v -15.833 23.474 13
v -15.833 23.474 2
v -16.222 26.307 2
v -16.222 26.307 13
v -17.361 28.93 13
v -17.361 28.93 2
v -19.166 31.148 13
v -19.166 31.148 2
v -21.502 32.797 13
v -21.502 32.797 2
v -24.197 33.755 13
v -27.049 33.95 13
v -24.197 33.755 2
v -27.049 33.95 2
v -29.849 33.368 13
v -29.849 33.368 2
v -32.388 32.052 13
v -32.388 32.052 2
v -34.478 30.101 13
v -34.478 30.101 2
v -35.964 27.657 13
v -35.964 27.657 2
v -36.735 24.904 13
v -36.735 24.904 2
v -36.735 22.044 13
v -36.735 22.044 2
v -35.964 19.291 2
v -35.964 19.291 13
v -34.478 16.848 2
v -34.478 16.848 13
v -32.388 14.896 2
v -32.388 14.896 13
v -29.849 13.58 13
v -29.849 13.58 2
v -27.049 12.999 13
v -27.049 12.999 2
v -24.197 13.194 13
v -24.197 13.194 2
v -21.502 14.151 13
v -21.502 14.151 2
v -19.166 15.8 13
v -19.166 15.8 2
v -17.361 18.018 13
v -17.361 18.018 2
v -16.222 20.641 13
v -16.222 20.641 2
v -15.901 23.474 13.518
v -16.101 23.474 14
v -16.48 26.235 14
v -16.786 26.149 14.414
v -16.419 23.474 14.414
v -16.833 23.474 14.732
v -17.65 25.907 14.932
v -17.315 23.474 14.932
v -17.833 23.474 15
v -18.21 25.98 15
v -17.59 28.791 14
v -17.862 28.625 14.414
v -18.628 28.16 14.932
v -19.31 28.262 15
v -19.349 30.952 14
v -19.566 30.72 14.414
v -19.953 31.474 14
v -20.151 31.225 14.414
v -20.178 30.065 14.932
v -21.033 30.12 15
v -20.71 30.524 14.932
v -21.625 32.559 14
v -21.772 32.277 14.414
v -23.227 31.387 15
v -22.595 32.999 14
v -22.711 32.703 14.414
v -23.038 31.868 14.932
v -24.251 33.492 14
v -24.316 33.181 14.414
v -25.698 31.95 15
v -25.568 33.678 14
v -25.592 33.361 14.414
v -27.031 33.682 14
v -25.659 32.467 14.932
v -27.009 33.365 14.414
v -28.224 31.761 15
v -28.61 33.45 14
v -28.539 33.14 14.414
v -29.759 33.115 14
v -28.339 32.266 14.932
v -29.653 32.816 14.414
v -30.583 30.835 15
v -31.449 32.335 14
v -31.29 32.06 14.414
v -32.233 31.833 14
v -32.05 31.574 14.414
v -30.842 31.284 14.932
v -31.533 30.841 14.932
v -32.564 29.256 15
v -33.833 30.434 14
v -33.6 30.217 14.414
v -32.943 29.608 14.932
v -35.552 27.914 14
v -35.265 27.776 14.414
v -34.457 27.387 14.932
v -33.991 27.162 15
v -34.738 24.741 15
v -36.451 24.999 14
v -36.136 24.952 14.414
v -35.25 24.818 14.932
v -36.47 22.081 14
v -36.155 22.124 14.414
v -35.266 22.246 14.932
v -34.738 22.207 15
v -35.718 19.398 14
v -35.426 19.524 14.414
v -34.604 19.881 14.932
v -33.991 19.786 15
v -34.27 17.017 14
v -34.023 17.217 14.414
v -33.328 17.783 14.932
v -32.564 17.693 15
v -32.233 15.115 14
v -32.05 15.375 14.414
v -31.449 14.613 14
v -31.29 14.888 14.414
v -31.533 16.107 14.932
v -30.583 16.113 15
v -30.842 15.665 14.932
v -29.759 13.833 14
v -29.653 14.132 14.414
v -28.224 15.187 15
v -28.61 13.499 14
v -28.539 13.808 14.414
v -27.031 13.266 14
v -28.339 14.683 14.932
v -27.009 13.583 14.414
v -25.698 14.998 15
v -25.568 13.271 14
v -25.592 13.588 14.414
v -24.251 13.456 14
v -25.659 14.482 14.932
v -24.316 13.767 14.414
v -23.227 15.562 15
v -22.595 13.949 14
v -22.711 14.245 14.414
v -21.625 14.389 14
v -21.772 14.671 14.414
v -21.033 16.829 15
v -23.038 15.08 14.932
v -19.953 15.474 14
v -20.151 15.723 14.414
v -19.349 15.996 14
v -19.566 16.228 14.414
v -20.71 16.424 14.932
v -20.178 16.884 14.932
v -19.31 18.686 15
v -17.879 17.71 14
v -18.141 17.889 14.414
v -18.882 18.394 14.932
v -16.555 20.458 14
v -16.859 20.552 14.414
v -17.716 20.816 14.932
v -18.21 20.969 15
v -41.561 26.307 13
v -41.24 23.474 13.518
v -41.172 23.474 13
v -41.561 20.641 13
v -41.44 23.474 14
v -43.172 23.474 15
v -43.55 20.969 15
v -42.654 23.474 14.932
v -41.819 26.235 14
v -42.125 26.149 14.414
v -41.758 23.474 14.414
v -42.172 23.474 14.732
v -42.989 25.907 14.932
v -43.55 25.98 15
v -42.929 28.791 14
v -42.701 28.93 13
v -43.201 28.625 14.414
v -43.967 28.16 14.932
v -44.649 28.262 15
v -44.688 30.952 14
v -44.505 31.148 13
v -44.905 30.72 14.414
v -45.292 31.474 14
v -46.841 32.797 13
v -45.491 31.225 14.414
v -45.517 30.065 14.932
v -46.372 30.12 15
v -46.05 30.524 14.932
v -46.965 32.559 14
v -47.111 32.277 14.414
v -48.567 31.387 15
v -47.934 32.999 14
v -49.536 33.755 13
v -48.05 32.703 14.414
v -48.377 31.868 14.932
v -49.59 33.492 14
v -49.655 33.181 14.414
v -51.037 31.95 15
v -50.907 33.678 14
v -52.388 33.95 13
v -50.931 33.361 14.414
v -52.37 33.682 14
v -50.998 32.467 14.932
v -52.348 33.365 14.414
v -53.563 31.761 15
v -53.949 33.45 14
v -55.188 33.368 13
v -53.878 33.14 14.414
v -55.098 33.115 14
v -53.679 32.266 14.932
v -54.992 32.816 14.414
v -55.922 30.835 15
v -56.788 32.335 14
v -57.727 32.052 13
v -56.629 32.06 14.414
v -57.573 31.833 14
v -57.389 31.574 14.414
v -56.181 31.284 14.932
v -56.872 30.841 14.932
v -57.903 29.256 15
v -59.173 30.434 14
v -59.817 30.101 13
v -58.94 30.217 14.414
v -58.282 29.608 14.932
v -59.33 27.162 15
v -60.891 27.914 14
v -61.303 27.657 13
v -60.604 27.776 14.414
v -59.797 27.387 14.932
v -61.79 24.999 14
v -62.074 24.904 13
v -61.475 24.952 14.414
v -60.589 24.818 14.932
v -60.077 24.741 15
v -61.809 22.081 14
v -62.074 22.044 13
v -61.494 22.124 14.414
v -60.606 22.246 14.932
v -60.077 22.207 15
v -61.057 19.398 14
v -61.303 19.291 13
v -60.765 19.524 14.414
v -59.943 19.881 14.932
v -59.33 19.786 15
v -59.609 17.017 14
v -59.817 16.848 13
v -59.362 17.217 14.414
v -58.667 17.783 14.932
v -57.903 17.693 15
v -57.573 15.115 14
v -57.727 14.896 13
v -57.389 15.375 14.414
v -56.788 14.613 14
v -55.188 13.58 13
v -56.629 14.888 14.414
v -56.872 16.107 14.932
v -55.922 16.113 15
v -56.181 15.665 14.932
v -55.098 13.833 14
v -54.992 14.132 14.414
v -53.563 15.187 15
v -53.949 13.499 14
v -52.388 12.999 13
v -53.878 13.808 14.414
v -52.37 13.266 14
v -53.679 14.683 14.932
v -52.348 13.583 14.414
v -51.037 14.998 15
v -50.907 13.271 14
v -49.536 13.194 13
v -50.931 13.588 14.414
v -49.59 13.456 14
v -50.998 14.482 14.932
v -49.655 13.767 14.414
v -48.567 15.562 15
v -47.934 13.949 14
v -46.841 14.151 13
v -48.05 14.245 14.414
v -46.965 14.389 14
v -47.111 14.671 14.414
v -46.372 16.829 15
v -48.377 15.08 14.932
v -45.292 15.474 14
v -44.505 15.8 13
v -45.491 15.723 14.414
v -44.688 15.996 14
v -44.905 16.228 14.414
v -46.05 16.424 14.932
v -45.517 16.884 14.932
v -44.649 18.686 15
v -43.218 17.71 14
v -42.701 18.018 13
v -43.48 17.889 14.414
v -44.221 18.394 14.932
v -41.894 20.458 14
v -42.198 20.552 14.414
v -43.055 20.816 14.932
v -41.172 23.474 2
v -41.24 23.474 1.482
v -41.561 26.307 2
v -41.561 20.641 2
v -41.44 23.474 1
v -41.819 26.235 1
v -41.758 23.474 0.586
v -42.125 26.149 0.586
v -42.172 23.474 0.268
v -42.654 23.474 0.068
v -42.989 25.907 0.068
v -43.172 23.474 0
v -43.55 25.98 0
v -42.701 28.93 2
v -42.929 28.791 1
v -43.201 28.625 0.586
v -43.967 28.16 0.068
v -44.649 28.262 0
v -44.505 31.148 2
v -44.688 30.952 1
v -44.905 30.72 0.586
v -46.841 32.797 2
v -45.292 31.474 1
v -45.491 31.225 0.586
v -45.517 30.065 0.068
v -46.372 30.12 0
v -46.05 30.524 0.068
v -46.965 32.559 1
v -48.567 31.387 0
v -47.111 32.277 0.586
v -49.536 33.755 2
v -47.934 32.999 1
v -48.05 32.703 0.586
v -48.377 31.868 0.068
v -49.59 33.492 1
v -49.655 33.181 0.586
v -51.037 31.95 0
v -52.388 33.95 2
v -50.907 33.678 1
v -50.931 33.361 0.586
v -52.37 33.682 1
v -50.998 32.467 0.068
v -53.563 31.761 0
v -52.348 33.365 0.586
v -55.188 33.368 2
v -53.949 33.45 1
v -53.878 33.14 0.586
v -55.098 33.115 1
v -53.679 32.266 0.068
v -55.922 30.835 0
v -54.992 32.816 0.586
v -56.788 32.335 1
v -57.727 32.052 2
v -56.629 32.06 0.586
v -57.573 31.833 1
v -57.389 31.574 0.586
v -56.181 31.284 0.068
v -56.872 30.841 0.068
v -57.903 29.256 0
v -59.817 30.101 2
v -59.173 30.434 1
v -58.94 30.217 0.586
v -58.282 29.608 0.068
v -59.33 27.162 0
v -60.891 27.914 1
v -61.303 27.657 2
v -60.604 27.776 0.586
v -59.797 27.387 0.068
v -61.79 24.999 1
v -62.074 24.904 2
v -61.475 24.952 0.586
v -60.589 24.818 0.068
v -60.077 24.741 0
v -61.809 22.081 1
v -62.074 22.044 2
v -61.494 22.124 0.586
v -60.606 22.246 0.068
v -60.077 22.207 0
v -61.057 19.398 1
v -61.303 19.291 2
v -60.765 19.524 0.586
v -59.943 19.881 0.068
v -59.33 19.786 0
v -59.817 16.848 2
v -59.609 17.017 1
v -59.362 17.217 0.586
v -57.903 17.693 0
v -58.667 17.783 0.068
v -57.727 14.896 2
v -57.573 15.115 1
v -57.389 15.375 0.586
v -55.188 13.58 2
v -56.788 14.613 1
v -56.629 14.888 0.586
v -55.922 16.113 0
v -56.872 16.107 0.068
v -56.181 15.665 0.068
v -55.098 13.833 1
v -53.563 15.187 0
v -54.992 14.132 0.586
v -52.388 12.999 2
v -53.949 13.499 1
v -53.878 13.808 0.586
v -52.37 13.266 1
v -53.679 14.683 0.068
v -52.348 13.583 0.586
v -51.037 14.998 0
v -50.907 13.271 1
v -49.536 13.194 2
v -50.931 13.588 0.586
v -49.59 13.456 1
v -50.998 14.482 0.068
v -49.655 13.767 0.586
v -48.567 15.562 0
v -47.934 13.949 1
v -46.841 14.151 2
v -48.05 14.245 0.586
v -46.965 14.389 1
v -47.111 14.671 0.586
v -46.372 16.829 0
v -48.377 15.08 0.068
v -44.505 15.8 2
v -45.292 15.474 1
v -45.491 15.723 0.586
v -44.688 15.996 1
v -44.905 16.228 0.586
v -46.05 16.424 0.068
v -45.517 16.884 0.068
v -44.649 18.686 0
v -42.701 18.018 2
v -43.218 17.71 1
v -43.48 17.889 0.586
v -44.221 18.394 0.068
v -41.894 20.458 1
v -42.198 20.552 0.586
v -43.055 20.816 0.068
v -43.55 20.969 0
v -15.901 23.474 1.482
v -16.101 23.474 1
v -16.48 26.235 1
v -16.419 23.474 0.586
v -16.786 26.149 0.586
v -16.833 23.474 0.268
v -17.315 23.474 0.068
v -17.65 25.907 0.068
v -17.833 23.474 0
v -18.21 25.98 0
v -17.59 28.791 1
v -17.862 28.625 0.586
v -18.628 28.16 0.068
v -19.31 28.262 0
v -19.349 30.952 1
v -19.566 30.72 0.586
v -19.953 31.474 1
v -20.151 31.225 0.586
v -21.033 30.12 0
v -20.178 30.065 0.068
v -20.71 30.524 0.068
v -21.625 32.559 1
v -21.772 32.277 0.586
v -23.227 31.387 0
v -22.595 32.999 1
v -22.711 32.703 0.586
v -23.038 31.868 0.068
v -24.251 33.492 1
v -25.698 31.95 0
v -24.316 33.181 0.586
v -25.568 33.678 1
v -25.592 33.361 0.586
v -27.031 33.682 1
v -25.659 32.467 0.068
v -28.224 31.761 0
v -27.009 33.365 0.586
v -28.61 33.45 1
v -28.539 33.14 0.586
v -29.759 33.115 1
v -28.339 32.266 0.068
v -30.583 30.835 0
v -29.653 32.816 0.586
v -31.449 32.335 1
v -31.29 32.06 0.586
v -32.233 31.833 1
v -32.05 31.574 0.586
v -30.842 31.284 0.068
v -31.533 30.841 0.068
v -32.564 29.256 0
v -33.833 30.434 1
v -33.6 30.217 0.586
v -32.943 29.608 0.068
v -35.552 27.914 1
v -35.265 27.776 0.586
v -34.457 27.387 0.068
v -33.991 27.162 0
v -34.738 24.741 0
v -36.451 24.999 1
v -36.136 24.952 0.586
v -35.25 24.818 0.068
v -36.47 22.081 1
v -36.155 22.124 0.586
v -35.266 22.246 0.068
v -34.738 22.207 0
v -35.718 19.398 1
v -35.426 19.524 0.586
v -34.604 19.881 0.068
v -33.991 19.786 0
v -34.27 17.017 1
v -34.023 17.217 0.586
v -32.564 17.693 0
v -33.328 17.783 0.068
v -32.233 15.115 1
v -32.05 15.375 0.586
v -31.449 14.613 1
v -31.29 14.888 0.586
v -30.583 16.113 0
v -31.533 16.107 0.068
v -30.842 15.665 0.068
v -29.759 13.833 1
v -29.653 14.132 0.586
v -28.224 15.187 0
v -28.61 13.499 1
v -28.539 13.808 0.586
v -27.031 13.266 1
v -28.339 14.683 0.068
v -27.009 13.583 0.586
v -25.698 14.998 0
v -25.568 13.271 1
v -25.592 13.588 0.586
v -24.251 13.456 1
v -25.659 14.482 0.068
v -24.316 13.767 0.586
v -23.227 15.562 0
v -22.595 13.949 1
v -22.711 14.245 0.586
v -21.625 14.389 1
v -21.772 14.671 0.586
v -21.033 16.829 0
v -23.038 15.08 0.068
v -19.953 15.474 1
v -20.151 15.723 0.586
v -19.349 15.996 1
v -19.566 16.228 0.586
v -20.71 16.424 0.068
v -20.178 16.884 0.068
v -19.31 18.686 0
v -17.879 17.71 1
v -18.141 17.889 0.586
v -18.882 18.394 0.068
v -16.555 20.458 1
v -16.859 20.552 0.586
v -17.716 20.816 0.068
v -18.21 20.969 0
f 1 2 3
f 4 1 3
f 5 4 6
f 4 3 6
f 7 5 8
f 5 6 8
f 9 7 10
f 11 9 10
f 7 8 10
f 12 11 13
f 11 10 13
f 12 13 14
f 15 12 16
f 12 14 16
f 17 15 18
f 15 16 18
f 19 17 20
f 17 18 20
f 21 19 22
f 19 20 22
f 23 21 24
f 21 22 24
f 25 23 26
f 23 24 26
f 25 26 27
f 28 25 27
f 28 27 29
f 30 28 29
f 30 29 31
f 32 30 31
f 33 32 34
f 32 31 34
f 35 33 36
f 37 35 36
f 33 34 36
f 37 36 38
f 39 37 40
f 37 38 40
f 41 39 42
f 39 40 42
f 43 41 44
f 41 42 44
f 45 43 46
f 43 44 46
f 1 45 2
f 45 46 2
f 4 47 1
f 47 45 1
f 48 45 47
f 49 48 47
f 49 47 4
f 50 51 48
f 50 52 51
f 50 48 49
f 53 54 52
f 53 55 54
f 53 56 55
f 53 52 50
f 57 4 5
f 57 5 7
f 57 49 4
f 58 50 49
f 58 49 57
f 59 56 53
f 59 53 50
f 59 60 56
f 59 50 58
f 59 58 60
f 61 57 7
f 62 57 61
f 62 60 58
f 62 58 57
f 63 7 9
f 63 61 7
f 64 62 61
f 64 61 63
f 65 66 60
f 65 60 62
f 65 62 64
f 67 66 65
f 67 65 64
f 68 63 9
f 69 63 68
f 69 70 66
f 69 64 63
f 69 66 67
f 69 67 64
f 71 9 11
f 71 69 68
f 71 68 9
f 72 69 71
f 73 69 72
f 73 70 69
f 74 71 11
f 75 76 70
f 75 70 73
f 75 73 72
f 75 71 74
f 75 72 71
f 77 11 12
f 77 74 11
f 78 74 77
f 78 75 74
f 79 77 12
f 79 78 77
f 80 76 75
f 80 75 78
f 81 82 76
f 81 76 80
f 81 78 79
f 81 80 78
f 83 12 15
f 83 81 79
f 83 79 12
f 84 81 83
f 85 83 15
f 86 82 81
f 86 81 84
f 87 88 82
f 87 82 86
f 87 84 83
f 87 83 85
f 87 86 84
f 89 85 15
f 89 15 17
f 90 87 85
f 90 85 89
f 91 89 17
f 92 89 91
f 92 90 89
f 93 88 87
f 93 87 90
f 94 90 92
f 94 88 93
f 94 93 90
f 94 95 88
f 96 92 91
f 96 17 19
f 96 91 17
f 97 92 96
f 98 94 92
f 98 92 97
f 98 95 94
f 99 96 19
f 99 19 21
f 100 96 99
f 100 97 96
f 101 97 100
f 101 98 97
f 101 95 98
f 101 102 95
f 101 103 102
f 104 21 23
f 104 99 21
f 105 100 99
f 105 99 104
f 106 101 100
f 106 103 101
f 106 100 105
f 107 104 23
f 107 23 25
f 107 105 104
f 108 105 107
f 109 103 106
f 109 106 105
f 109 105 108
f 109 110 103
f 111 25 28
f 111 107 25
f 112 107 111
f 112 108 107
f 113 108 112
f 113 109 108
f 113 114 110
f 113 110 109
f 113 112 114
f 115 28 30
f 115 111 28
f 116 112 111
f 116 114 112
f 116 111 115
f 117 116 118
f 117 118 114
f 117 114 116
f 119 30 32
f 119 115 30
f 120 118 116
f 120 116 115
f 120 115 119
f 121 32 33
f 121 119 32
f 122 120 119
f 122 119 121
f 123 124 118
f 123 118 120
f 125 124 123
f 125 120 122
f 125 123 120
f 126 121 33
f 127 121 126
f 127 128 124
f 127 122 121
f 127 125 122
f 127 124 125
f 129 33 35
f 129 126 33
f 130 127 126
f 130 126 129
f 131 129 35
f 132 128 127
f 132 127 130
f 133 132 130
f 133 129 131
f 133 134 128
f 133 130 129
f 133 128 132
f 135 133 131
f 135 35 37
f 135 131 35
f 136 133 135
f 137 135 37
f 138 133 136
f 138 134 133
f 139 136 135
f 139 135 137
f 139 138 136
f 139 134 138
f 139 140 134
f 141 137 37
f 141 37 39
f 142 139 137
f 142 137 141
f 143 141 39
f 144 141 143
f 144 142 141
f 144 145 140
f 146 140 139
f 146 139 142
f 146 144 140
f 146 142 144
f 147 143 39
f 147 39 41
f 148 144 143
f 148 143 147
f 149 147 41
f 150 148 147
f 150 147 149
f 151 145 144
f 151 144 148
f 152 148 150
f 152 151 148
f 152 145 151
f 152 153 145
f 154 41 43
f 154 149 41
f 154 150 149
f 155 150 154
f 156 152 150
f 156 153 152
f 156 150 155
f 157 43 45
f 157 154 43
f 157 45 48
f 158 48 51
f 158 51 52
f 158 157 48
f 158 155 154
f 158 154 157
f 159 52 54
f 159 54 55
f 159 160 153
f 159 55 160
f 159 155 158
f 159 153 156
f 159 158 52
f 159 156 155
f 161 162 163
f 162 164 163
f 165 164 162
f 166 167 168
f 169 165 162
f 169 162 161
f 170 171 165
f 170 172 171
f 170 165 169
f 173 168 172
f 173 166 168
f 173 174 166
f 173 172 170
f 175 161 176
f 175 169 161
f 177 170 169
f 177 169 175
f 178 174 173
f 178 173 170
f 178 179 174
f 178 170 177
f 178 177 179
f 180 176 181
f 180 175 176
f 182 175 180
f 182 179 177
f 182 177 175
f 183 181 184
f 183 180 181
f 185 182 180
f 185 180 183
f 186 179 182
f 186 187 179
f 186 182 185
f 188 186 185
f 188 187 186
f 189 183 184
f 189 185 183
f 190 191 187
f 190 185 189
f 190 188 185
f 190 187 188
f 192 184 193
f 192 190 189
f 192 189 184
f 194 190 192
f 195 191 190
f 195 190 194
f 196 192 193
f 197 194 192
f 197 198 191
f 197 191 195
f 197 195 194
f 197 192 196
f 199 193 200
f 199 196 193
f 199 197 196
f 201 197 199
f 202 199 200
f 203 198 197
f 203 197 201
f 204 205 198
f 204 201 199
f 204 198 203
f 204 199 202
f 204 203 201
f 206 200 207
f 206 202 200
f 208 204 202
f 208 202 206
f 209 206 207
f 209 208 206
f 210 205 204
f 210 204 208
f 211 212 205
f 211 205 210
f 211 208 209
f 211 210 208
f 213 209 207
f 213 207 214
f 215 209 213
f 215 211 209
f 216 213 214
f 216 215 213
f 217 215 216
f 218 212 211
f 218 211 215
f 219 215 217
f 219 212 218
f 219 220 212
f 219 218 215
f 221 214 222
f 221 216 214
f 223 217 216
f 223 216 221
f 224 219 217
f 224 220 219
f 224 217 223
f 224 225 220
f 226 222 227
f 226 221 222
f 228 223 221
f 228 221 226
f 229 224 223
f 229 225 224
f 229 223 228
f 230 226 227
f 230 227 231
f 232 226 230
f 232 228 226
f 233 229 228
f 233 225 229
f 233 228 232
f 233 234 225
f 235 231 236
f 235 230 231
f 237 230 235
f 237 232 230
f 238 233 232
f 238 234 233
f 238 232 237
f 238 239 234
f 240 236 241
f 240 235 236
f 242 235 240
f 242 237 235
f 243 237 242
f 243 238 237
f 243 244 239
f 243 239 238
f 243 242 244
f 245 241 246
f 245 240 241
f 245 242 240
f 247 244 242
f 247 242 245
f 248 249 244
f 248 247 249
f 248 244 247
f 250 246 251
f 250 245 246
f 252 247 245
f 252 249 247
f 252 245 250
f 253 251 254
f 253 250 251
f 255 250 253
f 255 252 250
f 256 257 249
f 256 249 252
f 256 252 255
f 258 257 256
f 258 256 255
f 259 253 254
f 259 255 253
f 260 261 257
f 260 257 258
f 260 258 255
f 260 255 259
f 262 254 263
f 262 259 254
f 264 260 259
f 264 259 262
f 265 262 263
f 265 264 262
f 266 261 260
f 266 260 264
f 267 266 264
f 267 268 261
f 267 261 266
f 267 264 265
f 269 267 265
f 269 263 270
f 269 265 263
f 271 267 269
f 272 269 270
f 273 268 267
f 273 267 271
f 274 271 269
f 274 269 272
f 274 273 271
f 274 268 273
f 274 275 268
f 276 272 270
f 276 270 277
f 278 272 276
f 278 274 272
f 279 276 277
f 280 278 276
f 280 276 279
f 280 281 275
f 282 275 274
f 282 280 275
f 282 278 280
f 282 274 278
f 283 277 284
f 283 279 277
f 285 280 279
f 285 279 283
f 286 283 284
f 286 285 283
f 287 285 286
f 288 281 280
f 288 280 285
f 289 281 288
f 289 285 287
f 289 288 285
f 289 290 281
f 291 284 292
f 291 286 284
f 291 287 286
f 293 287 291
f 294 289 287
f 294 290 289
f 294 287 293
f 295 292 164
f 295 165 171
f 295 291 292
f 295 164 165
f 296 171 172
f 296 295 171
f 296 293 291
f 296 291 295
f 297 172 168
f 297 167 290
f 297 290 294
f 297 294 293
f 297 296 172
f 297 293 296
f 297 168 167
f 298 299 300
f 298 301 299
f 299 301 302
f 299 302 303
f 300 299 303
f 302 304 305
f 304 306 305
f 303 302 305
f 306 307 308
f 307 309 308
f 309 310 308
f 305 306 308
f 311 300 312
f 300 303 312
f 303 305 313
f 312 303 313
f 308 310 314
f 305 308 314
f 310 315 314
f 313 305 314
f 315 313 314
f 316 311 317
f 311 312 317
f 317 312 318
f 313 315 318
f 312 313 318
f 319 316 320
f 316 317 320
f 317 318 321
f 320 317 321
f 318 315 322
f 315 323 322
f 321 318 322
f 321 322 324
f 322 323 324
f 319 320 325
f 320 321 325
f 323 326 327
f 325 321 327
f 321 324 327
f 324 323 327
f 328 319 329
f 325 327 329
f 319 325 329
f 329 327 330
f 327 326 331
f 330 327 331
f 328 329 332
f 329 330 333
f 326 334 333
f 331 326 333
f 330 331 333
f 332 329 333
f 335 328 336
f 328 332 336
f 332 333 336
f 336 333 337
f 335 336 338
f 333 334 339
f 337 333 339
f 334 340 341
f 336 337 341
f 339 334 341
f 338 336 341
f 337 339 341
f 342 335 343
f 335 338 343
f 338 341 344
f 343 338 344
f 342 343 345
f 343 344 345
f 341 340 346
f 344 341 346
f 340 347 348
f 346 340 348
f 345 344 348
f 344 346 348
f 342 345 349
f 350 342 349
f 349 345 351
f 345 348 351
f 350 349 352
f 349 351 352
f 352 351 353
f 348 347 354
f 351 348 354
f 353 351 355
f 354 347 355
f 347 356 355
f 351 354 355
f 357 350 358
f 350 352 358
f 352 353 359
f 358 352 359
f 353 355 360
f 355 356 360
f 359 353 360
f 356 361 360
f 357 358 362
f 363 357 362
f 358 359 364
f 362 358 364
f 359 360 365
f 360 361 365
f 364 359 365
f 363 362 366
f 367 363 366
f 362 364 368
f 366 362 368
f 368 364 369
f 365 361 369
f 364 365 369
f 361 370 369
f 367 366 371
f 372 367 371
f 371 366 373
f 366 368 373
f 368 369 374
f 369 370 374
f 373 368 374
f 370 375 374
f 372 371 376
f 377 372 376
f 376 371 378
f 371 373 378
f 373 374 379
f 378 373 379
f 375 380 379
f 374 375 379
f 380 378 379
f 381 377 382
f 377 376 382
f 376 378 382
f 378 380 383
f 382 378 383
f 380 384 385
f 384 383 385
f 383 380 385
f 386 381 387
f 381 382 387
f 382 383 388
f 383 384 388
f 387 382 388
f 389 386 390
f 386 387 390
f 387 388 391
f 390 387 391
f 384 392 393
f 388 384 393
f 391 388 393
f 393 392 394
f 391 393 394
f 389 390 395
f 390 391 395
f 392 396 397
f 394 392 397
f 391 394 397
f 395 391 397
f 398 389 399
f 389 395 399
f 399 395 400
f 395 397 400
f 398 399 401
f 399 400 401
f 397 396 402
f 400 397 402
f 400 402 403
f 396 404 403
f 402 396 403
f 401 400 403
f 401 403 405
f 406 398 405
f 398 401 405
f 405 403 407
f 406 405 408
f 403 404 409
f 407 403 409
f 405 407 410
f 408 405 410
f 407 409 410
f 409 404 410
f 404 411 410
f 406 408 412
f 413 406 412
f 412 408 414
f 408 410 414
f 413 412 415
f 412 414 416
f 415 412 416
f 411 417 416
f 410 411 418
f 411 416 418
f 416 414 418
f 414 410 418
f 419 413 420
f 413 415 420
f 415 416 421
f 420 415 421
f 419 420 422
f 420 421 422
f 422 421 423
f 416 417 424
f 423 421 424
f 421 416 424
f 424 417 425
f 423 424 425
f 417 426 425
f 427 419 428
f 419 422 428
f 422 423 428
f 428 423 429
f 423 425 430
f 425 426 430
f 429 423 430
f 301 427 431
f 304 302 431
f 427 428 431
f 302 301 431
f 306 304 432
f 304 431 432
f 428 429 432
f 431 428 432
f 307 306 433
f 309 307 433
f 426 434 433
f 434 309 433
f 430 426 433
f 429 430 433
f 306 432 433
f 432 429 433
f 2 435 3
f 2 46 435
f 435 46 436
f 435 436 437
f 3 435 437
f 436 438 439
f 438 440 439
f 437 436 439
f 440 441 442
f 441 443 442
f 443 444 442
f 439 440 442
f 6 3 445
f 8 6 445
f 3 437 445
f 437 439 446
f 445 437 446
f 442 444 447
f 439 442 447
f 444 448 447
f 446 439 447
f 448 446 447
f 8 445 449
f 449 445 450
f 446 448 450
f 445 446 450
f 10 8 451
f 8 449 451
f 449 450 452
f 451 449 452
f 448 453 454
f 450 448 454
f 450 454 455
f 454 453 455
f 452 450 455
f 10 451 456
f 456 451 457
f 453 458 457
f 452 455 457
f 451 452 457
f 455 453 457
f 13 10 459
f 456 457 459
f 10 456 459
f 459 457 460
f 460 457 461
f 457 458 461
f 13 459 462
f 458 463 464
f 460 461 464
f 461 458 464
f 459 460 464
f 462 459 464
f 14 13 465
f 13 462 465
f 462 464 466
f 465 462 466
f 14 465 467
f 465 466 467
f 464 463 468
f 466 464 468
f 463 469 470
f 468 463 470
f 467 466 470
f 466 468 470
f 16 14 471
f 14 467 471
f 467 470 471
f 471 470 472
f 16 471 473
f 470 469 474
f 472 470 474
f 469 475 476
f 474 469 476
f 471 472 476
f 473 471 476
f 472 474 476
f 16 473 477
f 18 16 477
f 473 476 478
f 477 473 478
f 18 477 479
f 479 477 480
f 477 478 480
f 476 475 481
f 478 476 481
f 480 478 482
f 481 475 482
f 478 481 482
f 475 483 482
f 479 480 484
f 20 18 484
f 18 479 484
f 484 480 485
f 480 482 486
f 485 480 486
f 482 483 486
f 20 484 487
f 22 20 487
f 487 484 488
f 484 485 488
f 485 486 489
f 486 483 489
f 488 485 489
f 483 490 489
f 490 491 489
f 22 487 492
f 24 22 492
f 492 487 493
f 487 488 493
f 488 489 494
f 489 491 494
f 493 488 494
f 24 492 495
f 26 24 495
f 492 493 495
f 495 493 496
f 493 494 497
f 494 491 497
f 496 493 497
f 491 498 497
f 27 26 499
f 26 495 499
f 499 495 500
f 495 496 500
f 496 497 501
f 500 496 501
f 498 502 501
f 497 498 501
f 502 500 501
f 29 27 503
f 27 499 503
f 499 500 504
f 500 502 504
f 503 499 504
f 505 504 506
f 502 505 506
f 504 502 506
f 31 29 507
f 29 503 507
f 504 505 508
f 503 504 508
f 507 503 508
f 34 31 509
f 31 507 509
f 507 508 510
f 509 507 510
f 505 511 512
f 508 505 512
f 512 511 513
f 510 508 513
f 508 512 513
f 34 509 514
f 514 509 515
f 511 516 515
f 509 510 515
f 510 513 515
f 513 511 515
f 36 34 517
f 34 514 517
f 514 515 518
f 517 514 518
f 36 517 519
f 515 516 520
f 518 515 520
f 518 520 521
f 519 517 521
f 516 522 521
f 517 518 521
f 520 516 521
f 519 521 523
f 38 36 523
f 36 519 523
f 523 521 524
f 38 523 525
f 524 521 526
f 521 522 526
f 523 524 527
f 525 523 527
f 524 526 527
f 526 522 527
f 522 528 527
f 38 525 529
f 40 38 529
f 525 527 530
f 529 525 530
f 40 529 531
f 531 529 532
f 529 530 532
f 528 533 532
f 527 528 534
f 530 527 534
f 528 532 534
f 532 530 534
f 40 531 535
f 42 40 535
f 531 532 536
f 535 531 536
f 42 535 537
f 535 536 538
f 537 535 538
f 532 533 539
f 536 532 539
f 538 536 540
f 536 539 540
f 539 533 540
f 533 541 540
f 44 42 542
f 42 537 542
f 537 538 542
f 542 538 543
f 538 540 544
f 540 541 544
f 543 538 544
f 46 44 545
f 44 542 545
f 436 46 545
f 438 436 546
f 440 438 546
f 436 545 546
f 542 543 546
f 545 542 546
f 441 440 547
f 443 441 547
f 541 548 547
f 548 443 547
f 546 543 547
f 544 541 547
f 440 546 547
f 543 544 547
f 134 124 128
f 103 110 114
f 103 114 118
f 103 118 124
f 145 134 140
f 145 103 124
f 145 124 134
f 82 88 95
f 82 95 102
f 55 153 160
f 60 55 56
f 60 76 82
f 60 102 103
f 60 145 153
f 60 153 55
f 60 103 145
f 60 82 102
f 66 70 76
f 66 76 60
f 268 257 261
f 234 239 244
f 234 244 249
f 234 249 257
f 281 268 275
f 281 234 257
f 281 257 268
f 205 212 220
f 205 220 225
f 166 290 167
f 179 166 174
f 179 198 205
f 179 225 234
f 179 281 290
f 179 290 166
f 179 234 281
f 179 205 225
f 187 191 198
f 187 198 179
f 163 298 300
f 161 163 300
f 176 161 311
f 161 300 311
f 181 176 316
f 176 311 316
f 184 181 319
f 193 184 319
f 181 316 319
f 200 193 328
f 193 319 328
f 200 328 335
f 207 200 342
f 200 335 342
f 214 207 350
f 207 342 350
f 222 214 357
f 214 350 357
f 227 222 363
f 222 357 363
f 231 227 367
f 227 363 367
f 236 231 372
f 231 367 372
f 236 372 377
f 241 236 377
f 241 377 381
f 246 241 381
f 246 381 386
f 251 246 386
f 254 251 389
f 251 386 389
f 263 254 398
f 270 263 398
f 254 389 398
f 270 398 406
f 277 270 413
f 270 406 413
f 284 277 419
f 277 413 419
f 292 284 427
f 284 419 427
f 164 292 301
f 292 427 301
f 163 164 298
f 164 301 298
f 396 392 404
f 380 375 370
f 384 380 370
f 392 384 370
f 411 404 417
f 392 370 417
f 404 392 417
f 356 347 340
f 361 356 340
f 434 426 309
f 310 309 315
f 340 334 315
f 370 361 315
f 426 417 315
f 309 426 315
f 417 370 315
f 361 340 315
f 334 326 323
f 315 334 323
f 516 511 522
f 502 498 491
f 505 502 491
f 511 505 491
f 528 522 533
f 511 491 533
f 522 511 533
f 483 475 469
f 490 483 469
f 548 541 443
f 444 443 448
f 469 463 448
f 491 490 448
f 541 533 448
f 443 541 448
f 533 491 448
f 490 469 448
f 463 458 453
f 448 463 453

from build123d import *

# Parameters (mm, degrees)
F0_R     = 10.5
F1_DEPTH = 15
F2_R     = 2


with BuildPart() as f1:
    # F0 (on Top) → F1 (new body)
    with BuildSketch(Plane.XY):
        with Locations((-51.671926, 23.47412)):
            Circle(F0_R)
        with Locations((-26.332807, 23.47412)):
            Circle(F0_R)
    extrude(amount=F1_DEPTH)

    # F2
    f2_edges = [f1.edges().sort_by_distance(p)[0] for p in [
        (-36.832807, 23.47412, 15),
        (-62.171926, 23.47412, 15),
        (-62.171926, 23.47412, 0),
        (-36.832807, 23.47412, 0),
    ]]
    fillet(f2_edges, radius=F2_R)


solid = f1.part
